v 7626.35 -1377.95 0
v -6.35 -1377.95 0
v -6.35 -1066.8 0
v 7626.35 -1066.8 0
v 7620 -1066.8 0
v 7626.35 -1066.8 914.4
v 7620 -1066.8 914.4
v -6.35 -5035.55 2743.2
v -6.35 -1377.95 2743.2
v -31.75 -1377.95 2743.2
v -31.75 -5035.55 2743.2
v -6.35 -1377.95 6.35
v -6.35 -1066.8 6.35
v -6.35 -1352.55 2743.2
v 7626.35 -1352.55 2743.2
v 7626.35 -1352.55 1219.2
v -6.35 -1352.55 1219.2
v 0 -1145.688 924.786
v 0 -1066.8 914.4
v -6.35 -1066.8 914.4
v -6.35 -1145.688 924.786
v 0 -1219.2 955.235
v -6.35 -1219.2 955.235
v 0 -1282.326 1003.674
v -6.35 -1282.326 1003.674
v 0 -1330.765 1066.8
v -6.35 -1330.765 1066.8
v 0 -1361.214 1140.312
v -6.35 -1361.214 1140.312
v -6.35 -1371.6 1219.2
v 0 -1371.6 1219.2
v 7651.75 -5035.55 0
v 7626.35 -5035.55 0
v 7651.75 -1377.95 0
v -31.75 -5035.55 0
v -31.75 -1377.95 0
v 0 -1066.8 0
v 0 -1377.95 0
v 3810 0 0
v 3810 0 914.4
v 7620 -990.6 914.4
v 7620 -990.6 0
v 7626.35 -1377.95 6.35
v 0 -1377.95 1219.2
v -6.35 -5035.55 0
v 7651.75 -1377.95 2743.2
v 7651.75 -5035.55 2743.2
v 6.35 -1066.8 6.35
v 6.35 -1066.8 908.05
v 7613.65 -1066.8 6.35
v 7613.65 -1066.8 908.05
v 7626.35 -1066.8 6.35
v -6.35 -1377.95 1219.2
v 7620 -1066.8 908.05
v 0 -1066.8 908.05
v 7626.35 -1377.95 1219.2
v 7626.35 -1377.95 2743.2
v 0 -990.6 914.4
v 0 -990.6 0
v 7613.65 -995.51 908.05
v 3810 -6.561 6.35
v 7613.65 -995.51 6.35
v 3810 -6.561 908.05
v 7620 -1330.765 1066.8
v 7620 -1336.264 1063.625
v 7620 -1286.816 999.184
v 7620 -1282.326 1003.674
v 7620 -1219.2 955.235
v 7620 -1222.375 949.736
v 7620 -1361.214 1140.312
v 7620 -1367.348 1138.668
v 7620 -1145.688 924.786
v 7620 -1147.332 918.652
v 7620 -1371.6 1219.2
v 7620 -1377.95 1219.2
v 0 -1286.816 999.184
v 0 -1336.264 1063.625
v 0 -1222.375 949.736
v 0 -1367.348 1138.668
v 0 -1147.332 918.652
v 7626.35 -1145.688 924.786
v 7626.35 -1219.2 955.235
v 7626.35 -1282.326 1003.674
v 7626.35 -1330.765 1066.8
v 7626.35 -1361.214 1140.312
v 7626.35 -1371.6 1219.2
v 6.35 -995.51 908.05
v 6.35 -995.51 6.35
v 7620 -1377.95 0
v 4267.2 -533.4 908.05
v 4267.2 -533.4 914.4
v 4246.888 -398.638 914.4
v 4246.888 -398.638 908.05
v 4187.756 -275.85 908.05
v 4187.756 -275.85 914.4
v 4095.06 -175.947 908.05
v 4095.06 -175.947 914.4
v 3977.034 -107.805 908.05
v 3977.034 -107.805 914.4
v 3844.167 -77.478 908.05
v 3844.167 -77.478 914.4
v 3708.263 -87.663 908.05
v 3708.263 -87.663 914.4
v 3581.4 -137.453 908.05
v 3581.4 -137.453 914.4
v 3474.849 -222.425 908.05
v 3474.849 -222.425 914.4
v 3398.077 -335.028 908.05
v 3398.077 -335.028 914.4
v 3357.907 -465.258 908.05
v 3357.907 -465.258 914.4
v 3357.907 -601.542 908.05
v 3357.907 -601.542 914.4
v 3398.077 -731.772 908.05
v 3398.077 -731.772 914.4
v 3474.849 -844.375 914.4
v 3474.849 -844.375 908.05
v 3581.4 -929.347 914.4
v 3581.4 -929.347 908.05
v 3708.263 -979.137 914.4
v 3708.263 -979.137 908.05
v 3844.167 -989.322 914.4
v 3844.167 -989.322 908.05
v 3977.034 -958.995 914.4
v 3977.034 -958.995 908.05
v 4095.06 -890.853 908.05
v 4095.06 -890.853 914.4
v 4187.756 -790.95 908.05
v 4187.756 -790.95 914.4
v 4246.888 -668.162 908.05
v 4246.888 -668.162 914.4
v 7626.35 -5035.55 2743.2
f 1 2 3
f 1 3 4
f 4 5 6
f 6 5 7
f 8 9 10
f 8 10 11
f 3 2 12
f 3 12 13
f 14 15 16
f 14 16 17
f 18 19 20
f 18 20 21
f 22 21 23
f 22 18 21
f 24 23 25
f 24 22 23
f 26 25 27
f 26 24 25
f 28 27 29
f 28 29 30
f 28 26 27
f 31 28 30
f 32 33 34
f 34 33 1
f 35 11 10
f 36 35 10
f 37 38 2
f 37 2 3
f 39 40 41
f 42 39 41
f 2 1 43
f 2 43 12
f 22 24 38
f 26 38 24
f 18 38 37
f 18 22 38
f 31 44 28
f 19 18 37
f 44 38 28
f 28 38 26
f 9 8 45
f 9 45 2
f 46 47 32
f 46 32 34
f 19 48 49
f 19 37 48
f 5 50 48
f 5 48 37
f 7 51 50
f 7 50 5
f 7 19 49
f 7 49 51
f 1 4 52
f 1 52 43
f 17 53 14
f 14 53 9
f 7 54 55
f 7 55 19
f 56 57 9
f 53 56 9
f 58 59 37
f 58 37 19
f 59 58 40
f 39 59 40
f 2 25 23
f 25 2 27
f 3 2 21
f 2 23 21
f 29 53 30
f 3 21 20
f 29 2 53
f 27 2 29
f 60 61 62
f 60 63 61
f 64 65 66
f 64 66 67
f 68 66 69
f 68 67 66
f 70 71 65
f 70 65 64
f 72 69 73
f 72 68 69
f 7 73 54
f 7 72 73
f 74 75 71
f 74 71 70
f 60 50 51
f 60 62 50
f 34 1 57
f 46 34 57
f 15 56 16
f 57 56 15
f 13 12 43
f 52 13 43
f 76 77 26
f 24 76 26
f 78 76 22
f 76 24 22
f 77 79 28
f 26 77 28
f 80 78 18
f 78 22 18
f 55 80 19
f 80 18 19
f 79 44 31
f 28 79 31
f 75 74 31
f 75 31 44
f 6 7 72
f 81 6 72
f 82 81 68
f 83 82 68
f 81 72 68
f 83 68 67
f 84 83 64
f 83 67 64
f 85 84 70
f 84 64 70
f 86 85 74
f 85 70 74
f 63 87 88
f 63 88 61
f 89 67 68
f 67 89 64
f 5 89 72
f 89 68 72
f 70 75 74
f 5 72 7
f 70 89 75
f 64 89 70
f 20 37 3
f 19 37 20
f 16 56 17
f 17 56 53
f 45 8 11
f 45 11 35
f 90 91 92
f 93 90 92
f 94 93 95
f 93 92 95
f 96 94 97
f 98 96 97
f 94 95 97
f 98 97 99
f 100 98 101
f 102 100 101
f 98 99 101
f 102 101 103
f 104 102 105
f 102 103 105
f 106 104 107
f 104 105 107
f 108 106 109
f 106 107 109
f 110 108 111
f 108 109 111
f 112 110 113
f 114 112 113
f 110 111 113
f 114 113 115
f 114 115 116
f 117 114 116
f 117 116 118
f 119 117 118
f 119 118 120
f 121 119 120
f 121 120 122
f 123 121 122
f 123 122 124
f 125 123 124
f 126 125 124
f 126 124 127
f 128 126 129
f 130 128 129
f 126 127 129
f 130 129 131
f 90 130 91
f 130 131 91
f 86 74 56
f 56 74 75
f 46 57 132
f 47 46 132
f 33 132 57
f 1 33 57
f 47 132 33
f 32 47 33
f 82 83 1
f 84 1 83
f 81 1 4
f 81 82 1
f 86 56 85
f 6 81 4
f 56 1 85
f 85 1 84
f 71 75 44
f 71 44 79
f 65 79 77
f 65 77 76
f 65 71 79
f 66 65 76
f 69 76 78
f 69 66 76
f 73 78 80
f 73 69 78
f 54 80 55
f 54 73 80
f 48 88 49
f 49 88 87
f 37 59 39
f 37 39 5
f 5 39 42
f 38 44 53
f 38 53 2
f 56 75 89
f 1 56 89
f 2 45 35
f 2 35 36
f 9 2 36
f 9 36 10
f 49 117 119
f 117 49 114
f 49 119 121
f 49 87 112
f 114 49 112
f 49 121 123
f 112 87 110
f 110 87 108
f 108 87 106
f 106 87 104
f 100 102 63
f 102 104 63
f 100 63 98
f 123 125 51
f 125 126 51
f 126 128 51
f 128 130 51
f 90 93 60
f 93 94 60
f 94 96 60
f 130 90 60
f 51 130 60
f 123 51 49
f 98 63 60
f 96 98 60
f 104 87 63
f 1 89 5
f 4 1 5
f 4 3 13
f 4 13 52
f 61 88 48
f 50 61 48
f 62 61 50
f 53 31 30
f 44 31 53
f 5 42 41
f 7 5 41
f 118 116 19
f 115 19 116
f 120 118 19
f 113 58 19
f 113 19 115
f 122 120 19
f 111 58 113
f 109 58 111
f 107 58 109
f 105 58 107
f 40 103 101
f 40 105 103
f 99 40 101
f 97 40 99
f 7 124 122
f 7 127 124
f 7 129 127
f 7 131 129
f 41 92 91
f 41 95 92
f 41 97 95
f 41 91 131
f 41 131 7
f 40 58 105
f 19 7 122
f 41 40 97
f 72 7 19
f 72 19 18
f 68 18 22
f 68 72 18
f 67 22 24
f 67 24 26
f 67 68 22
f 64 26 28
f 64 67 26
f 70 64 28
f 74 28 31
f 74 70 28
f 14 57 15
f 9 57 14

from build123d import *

# Parameters (mm, degrees)
F0_W      = 7620
F0_H      = 914.4
F1_DEPTH  = 1066.8
F3_DEPTH  = 914.401
F4_T      = -6.35
F2_R      = 457.2
F5_DEPTH  = 6.35
F7_DEPTH  = 7620
F9_DEPTH  = 6.35
F14_DEPTH = 6.35
F16_DEPTH = 25.4
F18_W     = 7632.7
F18_H     = 1524
F19_DEPTH = 25.4


# Not quite as in the source:
# - a feature of the source that left no trace in its solid (it failed there, or was rolled back) is left out
# - a pattern or mirror of a feature is missing from the dataset's text; its kind, count and spacing are read off the source's solid


with BuildPart() as f1:
    # F0 (on Front) → F1 (new body)
    with BuildSketch(Plane.XZ):
        with Locations((3810, 457.2)):
            Rectangle(F0_W, F0_H)
    extrude(amount=F1_DEPTH)

    # F2 (on face) → F3 (cut, through all)
    with BuildSketch(Plane.XY.offset(914.4)):
        Polygon((7620, 0), (3810, 0), (7620, -990.5999898911), align=None)
        Polygon((0, -990.5999898911), (3810, 0), (0, 0), align=None)
    extrude(amount=-F3_DEPTH, mode=Mode.SUBTRACT)

    # F4
    f4_openings = [f1.faces().sort_by_distance(p)[0] for p in [
        (3810, -1066.8, 457.2),
    ]]
    offset(amount=F4_T, openings=f4_openings)

    # F2 (on face) → F5 (cut, through all)
    with BuildSketch(Plane.XY.offset(914.4)):
        with Locations((3810, -533.4)):
            Circle(F2_R)
    extrude(amount=-F5_DEPTH, mode=Mode.SUBTRACT)


with BuildPart() as f7:
    # F6 (on face) → F7 (new body, through all)
    with BuildSketch(Plane.YZ.offset(7620)):
        with BuildLine():
            ThreePointArc((-1066.8, 914.4), (-1282.3261469057, 1003.6738530943), (-1371.6, 1219.2))
            Line((-1371.6, 1219.2), (-1377.95, 1219.2))
            ThreePointArc((-1377.95, 1219.2), (-1286.8162749662, 999.1837250338), (-1066.8, 908.05))
            Line((-1066.8, 908.05), (-1066.8, 914.4))
        make_face()
    extrude(amount=-F7_DEPTH)


with BuildPart() as f9:
    # F8 (on face) → F9 (new body)
    with BuildSketch(Plane.YZ.offset(7620)):
        with BuildLine():
            Line((-1371.6, 1219.2), (-1377.95, 1219.2))
            ThreePointArc((-1377.95, 1219.2), (-1286.8162749662, 999.1837250338), (-1066.8, 908.05))
            Line((-1066.8, 908.05), (-1066.8, 914.4))
            ThreePointArc((-1066.8, 914.4), (-1282.3261469057, 1003.6738530943), (-1371.6, 1219.2))
        make_face()
        with BuildLine():
            ThreePointArc((-1066.8, 908.05), (-1286.8162749662, 999.1837250338), (-1377.95, 1219.2))
            Line((-1377.95, 1219.2), (-1377.95, 0))
            Line((-1377.95, 0), (-1066.8, 0))
            Line((-1066.8, 0), (-1066.8, 908.05))
        make_face()
    extrude(amount=F9_DEPTH)


with BuildPart() as f9_copies_1:
    # F9_copies: instance of F9
    add(f9.part.mirror(Plane(origin=(3810, 0, 0), x_dir=(0, 0, -1), z_dir=(-1, 0, 0))))


with BuildPart() as f14:
    # F13 (on face) → F14 (new body)
    with BuildSketch(Plane(origin=(0, 0, 0), x_dir=(1, 0, 0), z_dir=(0, 0, -1))):
        Polygon((-6.35, 1377.95), (-6.35, 1066.8), (0, 1066.8), (7620, 1066.8), (7626.35, 1066.8), (7626.35, 1377.95), align=None)
    extrude(amount=-F14_DEPTH)


with BuildPart() as f16:
    # F15 (on face) → F16 (new body)
    with BuildSketch(Plane.YZ.offset(7626.35)):
        Polygon((-1377.95, 1219.2), (-1377.95, 2743.2), (-5035.55, 2743.2), (-5035.55, 0), (-1377.95, 0), align=None)
    extrude(amount=F16_DEPTH)


with BuildPart() as f16_copies_1:
    # F16_copies: instance of F16
    add(f16.part.mirror(Plane(origin=(3810, 0, 0), x_dir=(0, 0, -1), z_dir=(-1, 0, 0))))


with BuildPart() as f19:
    # F18 (on face) → F19 (new body)
    with BuildSketch(Plane(origin=(0, -1377.95, 0), x_dir=(-1, 0, 0), z_dir=(0, 1, 0))):
        with Locations((-3810, 1981.2)):
            Rectangle(F18_W, F18_H)
    extrude(amount=F19_DEPTH)


solid = Compound([f1.part, f7.part, f9.part, f9_copies_1.part, f14.part, f16.part, f16_copies_1.part, f19.part])
